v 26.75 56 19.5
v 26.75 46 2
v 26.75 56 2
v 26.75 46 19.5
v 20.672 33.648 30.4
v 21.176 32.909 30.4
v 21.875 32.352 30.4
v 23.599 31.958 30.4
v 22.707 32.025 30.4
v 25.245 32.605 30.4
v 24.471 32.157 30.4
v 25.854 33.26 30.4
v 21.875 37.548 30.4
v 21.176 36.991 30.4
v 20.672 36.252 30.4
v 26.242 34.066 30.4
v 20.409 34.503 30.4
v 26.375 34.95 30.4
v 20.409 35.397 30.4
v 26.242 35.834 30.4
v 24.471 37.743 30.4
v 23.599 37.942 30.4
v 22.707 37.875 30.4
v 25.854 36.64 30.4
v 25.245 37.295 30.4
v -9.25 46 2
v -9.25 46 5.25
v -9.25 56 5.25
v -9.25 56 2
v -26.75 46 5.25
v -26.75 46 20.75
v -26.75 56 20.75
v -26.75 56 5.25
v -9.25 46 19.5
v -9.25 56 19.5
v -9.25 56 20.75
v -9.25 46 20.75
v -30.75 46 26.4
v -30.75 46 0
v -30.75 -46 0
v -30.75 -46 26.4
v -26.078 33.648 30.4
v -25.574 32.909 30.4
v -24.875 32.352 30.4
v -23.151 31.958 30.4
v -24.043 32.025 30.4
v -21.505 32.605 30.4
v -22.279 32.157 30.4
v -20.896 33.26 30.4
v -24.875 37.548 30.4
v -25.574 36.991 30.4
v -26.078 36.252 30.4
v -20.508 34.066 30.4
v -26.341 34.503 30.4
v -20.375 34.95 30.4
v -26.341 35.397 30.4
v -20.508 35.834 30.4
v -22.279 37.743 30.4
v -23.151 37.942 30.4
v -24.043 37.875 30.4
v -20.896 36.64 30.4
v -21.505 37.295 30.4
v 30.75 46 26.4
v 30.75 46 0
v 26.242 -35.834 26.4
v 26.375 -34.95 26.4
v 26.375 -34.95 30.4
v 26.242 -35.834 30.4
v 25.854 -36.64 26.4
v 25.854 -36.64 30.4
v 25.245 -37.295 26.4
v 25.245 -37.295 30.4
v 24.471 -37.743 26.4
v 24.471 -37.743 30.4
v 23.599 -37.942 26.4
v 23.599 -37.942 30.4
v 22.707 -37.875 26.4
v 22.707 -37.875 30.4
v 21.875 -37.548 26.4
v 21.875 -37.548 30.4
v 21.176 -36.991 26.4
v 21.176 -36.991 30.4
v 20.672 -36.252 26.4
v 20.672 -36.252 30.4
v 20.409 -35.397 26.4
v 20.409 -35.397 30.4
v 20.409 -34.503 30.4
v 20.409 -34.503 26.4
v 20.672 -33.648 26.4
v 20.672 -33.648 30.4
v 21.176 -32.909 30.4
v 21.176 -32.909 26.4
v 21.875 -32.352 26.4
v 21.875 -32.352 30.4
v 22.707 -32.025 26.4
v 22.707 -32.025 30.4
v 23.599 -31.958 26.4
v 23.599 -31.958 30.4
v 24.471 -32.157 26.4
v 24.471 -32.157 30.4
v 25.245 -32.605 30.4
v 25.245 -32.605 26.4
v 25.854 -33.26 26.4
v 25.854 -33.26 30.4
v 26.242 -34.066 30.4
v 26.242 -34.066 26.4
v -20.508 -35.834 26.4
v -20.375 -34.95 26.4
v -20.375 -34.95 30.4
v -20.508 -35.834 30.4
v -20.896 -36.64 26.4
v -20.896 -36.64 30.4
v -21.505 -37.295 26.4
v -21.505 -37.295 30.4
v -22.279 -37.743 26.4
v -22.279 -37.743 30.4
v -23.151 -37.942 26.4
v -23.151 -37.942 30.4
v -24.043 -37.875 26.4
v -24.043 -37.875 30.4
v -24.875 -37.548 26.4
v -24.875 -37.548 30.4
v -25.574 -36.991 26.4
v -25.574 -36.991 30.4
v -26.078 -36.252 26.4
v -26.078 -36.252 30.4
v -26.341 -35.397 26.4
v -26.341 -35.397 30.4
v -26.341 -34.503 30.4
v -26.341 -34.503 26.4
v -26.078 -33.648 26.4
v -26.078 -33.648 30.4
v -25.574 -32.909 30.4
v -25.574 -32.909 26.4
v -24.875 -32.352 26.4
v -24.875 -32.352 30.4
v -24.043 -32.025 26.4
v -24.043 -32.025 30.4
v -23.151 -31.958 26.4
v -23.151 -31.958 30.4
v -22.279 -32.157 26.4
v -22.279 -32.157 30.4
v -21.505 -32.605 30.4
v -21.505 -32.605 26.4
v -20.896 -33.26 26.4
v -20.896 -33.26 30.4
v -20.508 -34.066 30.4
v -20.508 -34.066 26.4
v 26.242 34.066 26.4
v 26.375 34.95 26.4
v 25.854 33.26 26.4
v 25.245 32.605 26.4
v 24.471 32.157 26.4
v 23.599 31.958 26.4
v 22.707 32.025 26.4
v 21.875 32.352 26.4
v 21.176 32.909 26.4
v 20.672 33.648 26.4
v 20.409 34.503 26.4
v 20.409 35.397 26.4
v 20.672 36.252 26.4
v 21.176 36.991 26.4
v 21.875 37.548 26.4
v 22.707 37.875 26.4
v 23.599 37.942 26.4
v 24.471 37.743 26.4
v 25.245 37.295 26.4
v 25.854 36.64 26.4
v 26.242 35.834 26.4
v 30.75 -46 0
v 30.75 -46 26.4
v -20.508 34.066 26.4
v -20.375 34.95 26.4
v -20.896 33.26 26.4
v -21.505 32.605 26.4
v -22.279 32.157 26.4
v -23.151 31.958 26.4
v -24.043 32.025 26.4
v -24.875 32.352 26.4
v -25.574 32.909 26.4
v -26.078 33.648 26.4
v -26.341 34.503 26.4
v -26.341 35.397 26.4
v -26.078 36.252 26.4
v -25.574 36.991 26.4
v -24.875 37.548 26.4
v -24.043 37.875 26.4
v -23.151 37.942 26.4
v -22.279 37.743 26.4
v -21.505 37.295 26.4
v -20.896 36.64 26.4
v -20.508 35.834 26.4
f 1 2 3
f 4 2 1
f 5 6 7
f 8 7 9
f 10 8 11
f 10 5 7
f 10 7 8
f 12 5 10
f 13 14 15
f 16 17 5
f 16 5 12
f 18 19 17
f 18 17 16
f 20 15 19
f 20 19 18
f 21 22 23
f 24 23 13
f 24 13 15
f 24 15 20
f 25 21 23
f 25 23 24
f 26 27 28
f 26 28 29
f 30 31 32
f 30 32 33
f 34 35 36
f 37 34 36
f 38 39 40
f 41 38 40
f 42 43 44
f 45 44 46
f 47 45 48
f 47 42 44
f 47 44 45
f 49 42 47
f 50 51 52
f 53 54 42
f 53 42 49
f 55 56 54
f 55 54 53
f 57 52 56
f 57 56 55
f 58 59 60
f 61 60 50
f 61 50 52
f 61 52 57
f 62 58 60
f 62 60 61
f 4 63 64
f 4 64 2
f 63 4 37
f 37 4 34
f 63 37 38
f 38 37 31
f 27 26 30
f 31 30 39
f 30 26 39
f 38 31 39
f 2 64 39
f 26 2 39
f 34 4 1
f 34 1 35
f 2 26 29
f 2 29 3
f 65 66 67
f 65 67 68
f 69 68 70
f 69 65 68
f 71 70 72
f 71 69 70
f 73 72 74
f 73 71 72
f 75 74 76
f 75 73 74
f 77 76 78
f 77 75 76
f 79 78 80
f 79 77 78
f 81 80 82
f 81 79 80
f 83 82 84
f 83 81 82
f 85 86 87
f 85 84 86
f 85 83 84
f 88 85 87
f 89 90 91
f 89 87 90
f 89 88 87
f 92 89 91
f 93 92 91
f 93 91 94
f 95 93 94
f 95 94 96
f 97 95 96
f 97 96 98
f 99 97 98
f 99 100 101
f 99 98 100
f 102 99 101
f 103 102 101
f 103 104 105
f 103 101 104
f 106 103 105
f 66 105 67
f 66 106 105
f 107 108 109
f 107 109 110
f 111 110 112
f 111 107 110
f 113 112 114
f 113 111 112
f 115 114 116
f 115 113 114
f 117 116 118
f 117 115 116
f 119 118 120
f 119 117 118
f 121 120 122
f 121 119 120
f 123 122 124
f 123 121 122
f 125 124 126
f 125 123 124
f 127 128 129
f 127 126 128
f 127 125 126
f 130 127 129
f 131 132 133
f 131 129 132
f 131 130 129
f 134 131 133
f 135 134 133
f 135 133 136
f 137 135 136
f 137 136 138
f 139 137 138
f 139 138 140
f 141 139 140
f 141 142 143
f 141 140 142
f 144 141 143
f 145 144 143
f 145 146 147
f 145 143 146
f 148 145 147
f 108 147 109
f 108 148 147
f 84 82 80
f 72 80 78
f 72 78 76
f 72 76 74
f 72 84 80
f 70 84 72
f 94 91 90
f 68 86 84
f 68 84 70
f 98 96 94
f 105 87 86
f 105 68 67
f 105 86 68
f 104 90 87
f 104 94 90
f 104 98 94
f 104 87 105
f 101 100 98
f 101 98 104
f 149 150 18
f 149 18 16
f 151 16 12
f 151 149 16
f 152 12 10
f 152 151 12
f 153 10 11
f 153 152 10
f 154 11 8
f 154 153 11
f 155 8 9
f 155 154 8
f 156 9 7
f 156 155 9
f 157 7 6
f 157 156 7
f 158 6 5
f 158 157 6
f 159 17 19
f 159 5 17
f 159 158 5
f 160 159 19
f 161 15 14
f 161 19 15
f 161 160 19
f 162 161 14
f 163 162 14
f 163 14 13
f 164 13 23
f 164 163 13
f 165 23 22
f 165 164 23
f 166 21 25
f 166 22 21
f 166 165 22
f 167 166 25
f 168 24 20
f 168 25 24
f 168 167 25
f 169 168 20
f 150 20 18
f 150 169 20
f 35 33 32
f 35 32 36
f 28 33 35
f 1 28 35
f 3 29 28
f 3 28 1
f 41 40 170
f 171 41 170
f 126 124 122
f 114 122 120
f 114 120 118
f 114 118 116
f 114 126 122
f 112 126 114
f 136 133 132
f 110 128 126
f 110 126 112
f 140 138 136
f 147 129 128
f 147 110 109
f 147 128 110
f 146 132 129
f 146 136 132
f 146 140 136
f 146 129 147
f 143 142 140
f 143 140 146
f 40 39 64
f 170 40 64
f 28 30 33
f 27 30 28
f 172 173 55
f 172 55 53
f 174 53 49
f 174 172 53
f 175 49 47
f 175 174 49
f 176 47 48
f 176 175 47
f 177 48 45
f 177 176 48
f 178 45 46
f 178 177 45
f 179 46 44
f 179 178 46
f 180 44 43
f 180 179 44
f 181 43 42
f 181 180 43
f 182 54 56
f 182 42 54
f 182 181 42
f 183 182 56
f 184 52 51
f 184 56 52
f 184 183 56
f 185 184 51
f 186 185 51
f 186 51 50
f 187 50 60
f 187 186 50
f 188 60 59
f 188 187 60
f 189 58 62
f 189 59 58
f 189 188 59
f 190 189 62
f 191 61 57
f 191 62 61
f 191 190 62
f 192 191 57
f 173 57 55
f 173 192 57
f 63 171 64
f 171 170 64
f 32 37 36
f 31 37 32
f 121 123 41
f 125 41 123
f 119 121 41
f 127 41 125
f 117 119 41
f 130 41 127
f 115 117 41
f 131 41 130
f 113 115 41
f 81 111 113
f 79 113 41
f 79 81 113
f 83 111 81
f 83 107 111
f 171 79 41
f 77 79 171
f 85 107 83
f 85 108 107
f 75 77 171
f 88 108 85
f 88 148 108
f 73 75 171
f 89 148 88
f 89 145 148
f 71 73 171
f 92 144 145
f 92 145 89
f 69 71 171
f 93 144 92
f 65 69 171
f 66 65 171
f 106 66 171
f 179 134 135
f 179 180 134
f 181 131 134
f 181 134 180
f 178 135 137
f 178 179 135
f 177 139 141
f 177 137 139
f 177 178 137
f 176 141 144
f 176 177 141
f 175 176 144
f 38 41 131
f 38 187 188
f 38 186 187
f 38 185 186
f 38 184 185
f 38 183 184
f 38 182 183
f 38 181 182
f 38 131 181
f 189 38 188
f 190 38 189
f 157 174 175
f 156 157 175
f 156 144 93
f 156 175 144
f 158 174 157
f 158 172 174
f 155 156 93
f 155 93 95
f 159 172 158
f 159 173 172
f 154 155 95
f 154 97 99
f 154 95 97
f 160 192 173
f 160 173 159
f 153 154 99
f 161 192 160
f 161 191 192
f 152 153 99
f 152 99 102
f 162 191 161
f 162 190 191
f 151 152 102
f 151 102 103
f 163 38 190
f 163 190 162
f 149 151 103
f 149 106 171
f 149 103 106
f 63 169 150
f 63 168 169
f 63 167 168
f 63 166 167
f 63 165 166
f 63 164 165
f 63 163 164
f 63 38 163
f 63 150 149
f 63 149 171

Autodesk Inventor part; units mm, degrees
ref_plane "YZ Plane" through (0, 0, 0) normal (1, 0, 0) x (0, 1, 0)
ref_plane "XZ Plane" through (0, 0, 0) normal (0, 1, 0) x (-1, 0, 0)
ref_plane "XY Plane" through (0, 0, 0) normal (0, 0, 1) x (1, 0, 0)
sketch "Sketch1" plane through (0, 0, 0) normal (0, 0, 1) x (1, 0, 0)
  line L0 (-30.75, -46) -> (30.75, -46)
  line L1 (30.75, -46) -> (30.75, 46)
  line L2 (30.75, 46) -> (-30.75, 46)
  line L3 (-30.75, 46) -> (-30.75, -46)
  line L4 (-30.75, -46) -> (30.75, 46) construction
  line L5 (30.75, -46) -> (-30.75, 46) construction
  point P0 (0, 0)
  dimension "d0" = 92
  dimension "d1" = 61.5
extrude "Extrusion1" add sketch "Sketch1" along normal blind 26.4
sketch "Sketch3" plane through (0, 0, 26.4) normal (0, 0, 1) x (1, 0, 0)
  line L0 (-23.375, -34.95) -> (23.375, -34.95) construction
  line L1 (23.375, -34.95) -> (23.375, 34.95) construction
  line L2 (23.375, 34.95) -> (-23.375, 34.95) construction
  line L3 (-23.375, 34.95) -> (-23.375, -34.95) construction
  line L4 (-23.375, -34.95) -> (23.375, 34.95) construction
  line L5 (23.375, -34.95) -> (-23.375, 34.95) construction
  circle A0 centre (-23.375, -34.95) radius 3
  circle A1 centre (23.375, -34.95) radius 3
  circle A2 centre (23.375, 34.95) radius 3
  circle A3 centre (-23.375, 34.95) radius 3
  point P0 (0, 0)
  dimension "d5" = 46.75
  dimension "d6" = 69.9
  dimension "d7" = 6
extrude "Extrusion2" add sketch "Sketch3" along normal blind 4
sketch "Sketch4" plane through (-30.75, 46, 0) normal (0, 1, 0) x (1, 0, 0)
  line L0 (0.1106, -5.25) -> (61.5, -5.25) construction
  line L1 (61.5, 0) -> (61.5, -26.4) construction
  line L2 (61.5, 0) -> (0, 0) construction
  line L3 (0, 0) -> (61.5, 0) construction
  line L4 (4, 0) -> (4, -26.4) construction
  line L5 (61.5, -26.4) -> (0, -26.4) construction
  line L6 (0, 0) -> (0, -26.4) construction
  line L7 (4, -5.25) -> (21.5, -5.25)
  line L8 (21.5, -5.25) -> (21.5, -20.75)
  line L9 (21.5, -20.75) -> (4, -20.75)
  line L10 (4, -20.75) -> (4, -5.25)
  point P0 (30.75, 0)
  dimension "d10" = 5.25
  dimension "d11" = 4
  dimension "d12" = 15.5
  dimension "d13" = 17.5
extrude "Extrusion3" add sketch "Sketch4" along normal blind 10
sketch "Sketch5" plane through (-30.75, 46, 0) normal (0, 1, 0) x (1, 0, 0)
  line L0 (57.5, 0) -> (57.5, -26.4) construction
  line L1 (61.5, -26.4) -> (0, -26.4) construction
  line L2 (61.5, 0) -> (61.5, -26.4) construction
  line L3 (61.5, 0) -> (0, 0) construction
  line L4 (21.5, 0) -> (21.5, -26.4) construction
  line L5 (21.5, -2) -> (57.5, -2) construction
  line L6 (21.5, -5.25) -> (21.5, -20.75) construction
  line L7 (21.5, -19.5) -> (57.5, -19.5) construction
  line L8 (21.5, -2) -> (57.5, -2)
  line L9 (57.5, -2) -> (57.5, -19.5)
  line L10 (57.5, -19.5) -> (21.5, -19.5)
  line L11 (21.5, -19.5) -> (21.5, -2)
  point P0 (30.75, 0)
  dimension "d16" = 4
  dimension "d17" = 40
  dimension "d18" = 2
  dimension "d19" = 19.5
extrude "Extrusion4" add sketch "Sketch5" along normal blind 10
properties part number "Vilros Pi Case"
